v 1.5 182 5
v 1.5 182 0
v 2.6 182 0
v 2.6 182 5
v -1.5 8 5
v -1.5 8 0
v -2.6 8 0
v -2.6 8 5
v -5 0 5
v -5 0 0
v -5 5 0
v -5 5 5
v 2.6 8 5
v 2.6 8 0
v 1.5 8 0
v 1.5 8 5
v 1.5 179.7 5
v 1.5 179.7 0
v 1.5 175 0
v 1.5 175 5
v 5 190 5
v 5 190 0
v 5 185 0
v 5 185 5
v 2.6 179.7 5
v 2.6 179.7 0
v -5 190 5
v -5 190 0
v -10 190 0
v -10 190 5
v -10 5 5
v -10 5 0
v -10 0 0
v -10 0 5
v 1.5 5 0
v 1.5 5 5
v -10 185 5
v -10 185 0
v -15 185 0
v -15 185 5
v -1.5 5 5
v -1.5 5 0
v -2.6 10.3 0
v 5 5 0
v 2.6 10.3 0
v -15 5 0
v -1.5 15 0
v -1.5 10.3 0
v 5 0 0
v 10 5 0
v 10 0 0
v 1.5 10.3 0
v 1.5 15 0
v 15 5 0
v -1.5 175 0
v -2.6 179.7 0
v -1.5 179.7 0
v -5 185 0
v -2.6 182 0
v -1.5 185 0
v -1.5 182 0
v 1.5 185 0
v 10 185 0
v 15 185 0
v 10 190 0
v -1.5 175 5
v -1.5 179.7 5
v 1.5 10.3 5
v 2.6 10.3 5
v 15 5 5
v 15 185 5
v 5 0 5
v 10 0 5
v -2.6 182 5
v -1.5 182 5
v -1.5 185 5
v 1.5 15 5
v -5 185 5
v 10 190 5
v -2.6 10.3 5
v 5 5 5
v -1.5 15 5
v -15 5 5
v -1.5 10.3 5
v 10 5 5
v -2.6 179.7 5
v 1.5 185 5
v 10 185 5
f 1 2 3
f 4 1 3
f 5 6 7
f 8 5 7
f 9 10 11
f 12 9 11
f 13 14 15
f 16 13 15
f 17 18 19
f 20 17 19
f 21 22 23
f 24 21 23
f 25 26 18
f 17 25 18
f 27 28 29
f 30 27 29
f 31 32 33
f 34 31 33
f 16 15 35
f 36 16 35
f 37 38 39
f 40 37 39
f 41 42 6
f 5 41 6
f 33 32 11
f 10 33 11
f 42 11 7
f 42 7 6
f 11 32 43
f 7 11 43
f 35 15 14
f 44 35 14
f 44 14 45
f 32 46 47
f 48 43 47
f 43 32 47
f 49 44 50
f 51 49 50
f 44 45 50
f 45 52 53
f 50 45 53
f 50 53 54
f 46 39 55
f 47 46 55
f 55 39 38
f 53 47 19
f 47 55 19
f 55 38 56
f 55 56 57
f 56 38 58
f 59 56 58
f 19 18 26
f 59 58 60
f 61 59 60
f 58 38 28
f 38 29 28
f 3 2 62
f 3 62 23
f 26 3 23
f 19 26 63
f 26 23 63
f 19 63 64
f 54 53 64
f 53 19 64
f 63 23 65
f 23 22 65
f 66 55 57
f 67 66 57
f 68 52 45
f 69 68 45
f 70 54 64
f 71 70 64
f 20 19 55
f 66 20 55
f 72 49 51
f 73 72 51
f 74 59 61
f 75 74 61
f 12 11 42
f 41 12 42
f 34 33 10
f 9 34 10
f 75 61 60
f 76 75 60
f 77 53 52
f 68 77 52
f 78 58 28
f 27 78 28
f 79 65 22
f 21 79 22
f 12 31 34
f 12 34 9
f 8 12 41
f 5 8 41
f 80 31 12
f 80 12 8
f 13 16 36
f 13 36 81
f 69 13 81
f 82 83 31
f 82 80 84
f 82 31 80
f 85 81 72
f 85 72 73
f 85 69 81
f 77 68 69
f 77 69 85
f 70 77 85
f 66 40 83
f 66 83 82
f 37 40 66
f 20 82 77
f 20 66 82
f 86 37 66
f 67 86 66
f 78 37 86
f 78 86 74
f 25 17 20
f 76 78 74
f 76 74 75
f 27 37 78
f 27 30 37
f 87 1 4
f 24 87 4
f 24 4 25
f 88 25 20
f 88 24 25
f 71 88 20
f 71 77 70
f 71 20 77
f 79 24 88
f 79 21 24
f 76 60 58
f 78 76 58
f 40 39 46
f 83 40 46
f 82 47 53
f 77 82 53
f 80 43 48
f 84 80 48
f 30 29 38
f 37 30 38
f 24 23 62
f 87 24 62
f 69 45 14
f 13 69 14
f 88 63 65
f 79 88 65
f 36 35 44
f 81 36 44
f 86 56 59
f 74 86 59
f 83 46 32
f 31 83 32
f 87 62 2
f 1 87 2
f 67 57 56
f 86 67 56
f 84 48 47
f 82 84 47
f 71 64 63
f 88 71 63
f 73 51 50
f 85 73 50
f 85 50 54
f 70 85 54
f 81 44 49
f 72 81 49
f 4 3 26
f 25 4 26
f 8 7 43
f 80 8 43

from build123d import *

# Parameters (mm, degrees)
BOSS_EXTRU_1_DEPTH = 5


with BuildPart() as part:
    # Esquisse1 → Boss.-Extru.1 (new body)
    with BuildSketch(Plane.XY):
        Polygon((-15, 185), (-15, 95), (15, 95), (15, 185), (10, 185), (10, 190), (5, 190), (5, 185), (1.5, 185), (1.5, 182), (2.6, 182), (2.6, 179.7), (1.5, 179.7), (1.5, 175), (-1.5, 175), (-1.5, 179.7), (-2.6, 179.7), (-2.6, 182), (-1.5, 182), (-1.5, 185), (-5, 185), (-5, 190), (-10, 190), (-10, 185), align=None)
        Polygon((-15, 5), (-10, 5), (-10, 0), (-5, 0), (-5, 5), (-1.5, 5), (-1.5, 8), (-2.6, 8), (-2.6, 10.3), (-1.5, 10.3), (-1.5, 15), (1.5, 15), (1.5, 10.3), (2.6, 10.3), (2.6, 8), (1.5, 8), (1.5, 5), (5, 5), (5, 0), (10, 0), (10, 5), (15, 5), (15, 95), (-15, 95), align=None)
    extrude(amount=BOSS_EXTRU_1_DEPTH)


solid = part.part
